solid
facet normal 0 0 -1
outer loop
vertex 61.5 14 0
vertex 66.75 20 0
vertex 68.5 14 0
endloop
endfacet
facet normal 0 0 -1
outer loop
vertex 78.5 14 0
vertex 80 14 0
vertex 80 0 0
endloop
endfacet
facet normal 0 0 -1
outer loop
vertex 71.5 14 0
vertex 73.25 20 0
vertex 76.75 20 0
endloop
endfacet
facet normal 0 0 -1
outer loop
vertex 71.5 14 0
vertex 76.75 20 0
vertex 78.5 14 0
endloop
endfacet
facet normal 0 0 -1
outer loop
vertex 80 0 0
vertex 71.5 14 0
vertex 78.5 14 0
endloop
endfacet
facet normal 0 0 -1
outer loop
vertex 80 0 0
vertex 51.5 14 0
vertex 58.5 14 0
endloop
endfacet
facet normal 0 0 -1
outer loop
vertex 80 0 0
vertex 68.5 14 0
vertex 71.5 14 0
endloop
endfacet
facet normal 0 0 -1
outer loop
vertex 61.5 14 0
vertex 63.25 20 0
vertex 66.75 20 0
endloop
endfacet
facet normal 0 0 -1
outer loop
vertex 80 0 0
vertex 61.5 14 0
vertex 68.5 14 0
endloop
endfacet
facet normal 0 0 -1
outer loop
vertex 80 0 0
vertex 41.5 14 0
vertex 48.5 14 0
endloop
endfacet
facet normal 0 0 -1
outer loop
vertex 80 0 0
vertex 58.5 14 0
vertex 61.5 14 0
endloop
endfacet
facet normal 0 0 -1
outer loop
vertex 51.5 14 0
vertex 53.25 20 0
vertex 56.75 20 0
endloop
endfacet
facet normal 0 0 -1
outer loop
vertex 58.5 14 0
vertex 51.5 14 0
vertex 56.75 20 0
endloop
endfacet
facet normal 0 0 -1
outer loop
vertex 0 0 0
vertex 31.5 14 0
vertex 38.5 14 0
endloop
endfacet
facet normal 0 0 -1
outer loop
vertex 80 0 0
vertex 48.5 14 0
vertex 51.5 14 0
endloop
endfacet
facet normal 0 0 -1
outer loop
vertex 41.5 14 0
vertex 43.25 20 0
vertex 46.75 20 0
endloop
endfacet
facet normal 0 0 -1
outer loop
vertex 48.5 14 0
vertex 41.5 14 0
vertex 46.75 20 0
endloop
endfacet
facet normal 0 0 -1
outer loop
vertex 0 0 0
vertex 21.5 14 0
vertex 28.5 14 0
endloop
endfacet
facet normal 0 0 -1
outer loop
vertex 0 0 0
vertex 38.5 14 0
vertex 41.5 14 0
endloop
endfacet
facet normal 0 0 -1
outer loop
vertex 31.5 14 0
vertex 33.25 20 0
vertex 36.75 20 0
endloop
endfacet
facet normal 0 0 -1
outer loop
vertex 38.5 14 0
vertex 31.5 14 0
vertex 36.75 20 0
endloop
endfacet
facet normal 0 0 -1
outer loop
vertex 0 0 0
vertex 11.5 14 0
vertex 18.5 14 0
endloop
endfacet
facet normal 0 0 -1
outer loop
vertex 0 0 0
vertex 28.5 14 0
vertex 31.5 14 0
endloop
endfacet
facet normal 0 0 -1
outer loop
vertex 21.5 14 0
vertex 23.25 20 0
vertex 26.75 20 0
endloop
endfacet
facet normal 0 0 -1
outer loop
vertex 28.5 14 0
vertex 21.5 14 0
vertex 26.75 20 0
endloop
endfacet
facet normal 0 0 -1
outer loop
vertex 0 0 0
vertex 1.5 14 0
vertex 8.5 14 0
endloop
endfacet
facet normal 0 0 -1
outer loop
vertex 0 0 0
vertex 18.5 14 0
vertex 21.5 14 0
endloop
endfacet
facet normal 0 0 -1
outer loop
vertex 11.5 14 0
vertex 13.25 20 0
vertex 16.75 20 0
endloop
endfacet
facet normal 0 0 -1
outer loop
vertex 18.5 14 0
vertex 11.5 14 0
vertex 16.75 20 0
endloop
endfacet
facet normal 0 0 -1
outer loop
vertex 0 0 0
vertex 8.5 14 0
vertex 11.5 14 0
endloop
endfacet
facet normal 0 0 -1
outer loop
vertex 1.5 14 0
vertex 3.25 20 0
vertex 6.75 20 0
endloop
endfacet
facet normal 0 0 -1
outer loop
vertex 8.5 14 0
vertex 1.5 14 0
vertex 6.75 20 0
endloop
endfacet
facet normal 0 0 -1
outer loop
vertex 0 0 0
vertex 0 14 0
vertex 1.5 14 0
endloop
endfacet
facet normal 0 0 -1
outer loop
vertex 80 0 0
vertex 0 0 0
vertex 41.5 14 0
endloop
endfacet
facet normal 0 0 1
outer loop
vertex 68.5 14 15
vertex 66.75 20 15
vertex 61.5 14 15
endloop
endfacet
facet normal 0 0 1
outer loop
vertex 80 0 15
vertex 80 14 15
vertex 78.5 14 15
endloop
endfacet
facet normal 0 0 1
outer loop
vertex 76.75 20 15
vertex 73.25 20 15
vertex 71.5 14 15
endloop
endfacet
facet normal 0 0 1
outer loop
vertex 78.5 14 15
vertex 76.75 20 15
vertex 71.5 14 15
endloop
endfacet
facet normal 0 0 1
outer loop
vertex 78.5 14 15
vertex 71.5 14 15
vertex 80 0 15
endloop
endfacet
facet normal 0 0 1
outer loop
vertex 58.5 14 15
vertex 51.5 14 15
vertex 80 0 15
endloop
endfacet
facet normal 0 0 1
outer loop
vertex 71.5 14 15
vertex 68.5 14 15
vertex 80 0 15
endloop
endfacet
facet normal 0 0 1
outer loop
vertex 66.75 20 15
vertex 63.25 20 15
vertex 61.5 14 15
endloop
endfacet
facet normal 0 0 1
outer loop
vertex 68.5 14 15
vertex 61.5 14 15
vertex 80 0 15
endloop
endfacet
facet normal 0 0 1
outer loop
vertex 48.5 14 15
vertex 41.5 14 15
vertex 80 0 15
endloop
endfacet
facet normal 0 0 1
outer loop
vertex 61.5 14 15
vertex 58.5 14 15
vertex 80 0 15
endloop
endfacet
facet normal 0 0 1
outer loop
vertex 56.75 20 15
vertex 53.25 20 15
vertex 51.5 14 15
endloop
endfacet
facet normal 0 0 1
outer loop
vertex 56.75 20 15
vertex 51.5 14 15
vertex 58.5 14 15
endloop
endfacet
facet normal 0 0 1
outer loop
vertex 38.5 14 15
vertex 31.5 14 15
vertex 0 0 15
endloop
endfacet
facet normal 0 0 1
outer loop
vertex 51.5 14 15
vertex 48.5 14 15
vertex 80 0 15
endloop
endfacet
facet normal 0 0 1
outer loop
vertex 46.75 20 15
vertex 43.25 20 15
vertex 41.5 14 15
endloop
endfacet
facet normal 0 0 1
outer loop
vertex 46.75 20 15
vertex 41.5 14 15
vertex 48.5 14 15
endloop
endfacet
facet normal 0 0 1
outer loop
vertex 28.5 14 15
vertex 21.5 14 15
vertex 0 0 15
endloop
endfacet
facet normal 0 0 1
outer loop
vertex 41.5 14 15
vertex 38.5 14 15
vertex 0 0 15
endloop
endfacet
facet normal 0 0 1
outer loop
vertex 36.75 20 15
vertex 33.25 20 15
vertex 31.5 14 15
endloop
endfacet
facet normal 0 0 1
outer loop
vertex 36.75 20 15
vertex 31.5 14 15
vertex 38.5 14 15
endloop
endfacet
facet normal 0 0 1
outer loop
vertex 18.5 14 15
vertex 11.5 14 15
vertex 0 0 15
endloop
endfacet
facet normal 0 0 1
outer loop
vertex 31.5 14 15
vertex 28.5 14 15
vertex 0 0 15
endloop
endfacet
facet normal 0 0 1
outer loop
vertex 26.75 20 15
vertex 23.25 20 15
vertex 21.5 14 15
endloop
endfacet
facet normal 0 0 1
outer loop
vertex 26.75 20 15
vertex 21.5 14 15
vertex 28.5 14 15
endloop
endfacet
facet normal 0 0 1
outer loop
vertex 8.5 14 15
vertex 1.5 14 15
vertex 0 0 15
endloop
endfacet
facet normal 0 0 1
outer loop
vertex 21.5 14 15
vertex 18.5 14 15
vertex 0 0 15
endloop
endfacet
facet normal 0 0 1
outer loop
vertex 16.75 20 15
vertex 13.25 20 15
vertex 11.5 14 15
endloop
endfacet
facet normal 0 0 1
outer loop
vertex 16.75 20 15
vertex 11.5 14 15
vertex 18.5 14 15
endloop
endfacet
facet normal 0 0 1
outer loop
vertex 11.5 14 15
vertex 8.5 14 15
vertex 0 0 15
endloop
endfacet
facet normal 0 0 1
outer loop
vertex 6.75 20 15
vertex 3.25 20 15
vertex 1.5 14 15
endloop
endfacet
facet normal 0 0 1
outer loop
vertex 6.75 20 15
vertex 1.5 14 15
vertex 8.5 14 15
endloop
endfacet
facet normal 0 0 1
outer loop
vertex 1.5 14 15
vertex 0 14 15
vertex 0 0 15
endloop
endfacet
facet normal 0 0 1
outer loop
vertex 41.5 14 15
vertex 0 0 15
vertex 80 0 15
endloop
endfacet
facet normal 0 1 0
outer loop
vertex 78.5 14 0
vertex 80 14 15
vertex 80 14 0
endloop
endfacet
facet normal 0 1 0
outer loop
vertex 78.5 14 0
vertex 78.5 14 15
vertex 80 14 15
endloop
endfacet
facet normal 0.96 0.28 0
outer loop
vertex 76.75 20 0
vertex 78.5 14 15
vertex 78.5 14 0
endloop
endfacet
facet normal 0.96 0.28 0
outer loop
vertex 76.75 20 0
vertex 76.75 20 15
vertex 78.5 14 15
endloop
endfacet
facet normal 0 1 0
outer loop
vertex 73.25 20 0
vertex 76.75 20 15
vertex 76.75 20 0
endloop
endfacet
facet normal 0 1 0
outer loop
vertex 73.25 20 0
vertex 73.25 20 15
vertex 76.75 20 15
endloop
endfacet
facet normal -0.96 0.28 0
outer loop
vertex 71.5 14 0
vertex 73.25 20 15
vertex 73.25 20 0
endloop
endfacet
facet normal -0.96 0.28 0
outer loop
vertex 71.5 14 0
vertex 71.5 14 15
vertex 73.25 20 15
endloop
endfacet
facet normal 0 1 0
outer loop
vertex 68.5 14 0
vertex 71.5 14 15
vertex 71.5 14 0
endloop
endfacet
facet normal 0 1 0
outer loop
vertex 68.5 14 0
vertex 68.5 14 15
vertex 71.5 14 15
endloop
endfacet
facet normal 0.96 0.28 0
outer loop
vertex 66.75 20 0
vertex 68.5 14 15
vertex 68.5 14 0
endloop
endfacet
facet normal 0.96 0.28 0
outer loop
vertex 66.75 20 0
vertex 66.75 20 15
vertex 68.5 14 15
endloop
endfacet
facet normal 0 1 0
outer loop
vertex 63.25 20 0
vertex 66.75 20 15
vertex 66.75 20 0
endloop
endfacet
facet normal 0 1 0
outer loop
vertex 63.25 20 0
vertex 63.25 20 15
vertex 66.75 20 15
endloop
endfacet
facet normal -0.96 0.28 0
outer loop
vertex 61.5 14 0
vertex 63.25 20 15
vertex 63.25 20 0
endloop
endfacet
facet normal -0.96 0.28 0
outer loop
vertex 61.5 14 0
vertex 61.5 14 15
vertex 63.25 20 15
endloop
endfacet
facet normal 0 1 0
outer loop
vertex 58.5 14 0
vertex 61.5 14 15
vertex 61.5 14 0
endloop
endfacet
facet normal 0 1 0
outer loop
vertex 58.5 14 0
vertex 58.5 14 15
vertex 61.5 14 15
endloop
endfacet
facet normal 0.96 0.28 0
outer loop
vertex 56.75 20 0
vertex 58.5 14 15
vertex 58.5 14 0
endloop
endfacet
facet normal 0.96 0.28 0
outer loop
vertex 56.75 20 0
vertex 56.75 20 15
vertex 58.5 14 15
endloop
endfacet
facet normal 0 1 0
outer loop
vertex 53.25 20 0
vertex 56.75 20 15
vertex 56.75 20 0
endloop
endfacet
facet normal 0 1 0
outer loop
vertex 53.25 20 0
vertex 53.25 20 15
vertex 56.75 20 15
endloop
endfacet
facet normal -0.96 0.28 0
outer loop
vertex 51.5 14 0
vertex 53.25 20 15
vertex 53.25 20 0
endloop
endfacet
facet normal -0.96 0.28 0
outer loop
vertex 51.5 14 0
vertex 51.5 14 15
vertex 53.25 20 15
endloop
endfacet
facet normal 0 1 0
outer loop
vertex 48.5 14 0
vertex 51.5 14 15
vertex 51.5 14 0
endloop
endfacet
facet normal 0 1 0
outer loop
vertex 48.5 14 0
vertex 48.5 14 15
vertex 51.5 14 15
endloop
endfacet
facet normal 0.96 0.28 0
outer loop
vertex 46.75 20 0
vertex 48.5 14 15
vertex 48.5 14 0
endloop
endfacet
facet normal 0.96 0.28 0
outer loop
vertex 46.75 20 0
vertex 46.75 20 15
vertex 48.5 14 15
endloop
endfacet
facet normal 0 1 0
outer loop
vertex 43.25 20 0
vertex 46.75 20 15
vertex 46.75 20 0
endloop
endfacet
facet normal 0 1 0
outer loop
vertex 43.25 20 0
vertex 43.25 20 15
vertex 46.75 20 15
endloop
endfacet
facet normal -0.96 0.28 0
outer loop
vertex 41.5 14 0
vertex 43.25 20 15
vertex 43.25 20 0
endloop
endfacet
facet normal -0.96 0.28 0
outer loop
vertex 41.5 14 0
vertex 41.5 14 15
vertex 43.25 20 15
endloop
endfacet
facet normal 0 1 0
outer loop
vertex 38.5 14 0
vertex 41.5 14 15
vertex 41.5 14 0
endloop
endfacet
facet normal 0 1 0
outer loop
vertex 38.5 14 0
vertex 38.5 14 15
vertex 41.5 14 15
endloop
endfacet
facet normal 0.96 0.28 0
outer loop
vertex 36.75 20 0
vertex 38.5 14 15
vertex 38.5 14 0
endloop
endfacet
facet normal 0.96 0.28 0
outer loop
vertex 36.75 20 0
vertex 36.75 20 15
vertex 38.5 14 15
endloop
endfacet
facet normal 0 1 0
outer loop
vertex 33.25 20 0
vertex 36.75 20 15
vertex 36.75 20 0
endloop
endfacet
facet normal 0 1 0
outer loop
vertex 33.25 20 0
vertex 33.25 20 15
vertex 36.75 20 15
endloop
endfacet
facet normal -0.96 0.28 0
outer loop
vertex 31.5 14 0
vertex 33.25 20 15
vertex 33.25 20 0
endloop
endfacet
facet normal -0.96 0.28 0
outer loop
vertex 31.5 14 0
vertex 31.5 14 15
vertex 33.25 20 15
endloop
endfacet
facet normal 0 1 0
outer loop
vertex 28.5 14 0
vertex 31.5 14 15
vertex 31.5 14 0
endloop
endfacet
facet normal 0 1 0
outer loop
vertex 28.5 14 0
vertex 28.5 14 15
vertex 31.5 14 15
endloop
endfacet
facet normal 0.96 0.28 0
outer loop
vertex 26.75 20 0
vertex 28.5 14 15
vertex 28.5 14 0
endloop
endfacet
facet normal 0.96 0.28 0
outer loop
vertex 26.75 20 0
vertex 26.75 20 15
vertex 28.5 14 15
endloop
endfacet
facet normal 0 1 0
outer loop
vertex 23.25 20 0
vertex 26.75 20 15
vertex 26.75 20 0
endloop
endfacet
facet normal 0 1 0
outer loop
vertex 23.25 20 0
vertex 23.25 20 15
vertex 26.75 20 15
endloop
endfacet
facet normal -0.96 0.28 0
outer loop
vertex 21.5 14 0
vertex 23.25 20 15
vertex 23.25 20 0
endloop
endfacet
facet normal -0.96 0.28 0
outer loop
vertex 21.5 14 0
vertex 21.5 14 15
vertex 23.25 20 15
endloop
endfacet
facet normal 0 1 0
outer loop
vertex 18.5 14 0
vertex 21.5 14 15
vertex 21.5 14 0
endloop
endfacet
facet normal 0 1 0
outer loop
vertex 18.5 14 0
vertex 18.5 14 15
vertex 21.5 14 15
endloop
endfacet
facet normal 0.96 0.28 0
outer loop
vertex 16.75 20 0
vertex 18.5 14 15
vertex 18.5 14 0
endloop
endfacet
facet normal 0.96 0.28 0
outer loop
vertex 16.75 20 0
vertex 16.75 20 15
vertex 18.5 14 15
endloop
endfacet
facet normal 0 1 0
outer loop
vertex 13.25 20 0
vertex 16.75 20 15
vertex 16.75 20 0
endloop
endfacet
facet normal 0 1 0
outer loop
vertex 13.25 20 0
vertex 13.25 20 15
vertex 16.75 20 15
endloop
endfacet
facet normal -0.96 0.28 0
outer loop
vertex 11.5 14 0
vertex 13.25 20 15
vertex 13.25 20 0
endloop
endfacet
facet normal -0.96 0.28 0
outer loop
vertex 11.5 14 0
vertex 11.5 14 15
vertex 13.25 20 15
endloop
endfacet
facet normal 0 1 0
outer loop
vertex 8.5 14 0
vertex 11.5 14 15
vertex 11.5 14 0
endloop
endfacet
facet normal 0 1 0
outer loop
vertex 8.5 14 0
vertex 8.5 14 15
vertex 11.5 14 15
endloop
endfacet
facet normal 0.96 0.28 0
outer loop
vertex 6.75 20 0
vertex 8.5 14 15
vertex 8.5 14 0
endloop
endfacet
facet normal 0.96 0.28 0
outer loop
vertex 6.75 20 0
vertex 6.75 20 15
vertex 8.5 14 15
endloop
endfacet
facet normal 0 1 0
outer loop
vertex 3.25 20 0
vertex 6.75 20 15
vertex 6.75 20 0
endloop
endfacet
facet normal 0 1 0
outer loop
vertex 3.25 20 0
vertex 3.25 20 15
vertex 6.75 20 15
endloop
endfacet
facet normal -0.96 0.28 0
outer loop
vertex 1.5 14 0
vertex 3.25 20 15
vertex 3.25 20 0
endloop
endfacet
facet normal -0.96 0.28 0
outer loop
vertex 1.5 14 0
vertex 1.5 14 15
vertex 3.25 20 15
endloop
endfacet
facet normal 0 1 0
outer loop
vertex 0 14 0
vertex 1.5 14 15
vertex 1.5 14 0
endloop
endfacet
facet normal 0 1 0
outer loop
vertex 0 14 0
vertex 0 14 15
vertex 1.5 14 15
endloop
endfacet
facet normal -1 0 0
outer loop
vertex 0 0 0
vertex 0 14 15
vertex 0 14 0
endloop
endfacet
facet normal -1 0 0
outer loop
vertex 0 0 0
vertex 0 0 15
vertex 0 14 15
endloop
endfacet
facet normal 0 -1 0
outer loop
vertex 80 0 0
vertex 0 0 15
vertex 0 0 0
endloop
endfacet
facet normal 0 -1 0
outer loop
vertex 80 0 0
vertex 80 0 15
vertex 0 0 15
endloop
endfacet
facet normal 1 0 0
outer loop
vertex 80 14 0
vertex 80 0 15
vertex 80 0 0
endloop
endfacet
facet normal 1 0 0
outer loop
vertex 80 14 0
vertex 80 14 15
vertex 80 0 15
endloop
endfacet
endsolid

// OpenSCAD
$fn = 32;

// ----------------------------------------------------------------------
// Gear rack: 8 teeth, pitch 10 mm
// ----------------------------------------------------------------------

// --- parameters (mm) ---
teeth = 8;                // number of teeth
pitch = 10;               // tooth pitch, X
root_w = 7;               // tooth width at the root
tip_w = 3.5;              // tooth width at the tip
base_h = 14;              // rack body height, Y
tooth_h = 6;              // tooth height above the body
plate_t = 15;             // rack width, Z (extrusion height)
fit_tol = 0.05;           // declared fit tolerance (prompt contract)
free_tol = 0.3;           // declared free tolerance (prompt contract)

rack_l = teeth * pitch;  // overall length
total_h = base_h + tooth_h;  // overall height

profile = [[0, 0], [80, 0], [80, 14], [78.5, 14], [76.75, 20], [73.25, 20], [71.5, 14], [68.5, 14], [66.75, 20], [63.25, 20], [61.5, 14], [58.5, 14], [56.75, 20], [53.25, 20], [51.5, 14], [48.5, 14], [46.75, 20], [43.25, 20], [41.5, 14], [38.5, 14], [36.75, 20], [33.25, 20], [31.5, 14], [28.5, 14], [26.75, 20], [23.25, 20], [21.5, 14], [18.5, 14], [16.75, 20], [13.25, 20], [11.5, 14], [8.5, 14], [6.75, 20], [3.25, 20], [1.5, 14], [0, 14]];  // primary outline, 36 points, counter clockwise

// --- the one profile operation ---
linear_extrude(height = plate_t) polygon(points = profile);
